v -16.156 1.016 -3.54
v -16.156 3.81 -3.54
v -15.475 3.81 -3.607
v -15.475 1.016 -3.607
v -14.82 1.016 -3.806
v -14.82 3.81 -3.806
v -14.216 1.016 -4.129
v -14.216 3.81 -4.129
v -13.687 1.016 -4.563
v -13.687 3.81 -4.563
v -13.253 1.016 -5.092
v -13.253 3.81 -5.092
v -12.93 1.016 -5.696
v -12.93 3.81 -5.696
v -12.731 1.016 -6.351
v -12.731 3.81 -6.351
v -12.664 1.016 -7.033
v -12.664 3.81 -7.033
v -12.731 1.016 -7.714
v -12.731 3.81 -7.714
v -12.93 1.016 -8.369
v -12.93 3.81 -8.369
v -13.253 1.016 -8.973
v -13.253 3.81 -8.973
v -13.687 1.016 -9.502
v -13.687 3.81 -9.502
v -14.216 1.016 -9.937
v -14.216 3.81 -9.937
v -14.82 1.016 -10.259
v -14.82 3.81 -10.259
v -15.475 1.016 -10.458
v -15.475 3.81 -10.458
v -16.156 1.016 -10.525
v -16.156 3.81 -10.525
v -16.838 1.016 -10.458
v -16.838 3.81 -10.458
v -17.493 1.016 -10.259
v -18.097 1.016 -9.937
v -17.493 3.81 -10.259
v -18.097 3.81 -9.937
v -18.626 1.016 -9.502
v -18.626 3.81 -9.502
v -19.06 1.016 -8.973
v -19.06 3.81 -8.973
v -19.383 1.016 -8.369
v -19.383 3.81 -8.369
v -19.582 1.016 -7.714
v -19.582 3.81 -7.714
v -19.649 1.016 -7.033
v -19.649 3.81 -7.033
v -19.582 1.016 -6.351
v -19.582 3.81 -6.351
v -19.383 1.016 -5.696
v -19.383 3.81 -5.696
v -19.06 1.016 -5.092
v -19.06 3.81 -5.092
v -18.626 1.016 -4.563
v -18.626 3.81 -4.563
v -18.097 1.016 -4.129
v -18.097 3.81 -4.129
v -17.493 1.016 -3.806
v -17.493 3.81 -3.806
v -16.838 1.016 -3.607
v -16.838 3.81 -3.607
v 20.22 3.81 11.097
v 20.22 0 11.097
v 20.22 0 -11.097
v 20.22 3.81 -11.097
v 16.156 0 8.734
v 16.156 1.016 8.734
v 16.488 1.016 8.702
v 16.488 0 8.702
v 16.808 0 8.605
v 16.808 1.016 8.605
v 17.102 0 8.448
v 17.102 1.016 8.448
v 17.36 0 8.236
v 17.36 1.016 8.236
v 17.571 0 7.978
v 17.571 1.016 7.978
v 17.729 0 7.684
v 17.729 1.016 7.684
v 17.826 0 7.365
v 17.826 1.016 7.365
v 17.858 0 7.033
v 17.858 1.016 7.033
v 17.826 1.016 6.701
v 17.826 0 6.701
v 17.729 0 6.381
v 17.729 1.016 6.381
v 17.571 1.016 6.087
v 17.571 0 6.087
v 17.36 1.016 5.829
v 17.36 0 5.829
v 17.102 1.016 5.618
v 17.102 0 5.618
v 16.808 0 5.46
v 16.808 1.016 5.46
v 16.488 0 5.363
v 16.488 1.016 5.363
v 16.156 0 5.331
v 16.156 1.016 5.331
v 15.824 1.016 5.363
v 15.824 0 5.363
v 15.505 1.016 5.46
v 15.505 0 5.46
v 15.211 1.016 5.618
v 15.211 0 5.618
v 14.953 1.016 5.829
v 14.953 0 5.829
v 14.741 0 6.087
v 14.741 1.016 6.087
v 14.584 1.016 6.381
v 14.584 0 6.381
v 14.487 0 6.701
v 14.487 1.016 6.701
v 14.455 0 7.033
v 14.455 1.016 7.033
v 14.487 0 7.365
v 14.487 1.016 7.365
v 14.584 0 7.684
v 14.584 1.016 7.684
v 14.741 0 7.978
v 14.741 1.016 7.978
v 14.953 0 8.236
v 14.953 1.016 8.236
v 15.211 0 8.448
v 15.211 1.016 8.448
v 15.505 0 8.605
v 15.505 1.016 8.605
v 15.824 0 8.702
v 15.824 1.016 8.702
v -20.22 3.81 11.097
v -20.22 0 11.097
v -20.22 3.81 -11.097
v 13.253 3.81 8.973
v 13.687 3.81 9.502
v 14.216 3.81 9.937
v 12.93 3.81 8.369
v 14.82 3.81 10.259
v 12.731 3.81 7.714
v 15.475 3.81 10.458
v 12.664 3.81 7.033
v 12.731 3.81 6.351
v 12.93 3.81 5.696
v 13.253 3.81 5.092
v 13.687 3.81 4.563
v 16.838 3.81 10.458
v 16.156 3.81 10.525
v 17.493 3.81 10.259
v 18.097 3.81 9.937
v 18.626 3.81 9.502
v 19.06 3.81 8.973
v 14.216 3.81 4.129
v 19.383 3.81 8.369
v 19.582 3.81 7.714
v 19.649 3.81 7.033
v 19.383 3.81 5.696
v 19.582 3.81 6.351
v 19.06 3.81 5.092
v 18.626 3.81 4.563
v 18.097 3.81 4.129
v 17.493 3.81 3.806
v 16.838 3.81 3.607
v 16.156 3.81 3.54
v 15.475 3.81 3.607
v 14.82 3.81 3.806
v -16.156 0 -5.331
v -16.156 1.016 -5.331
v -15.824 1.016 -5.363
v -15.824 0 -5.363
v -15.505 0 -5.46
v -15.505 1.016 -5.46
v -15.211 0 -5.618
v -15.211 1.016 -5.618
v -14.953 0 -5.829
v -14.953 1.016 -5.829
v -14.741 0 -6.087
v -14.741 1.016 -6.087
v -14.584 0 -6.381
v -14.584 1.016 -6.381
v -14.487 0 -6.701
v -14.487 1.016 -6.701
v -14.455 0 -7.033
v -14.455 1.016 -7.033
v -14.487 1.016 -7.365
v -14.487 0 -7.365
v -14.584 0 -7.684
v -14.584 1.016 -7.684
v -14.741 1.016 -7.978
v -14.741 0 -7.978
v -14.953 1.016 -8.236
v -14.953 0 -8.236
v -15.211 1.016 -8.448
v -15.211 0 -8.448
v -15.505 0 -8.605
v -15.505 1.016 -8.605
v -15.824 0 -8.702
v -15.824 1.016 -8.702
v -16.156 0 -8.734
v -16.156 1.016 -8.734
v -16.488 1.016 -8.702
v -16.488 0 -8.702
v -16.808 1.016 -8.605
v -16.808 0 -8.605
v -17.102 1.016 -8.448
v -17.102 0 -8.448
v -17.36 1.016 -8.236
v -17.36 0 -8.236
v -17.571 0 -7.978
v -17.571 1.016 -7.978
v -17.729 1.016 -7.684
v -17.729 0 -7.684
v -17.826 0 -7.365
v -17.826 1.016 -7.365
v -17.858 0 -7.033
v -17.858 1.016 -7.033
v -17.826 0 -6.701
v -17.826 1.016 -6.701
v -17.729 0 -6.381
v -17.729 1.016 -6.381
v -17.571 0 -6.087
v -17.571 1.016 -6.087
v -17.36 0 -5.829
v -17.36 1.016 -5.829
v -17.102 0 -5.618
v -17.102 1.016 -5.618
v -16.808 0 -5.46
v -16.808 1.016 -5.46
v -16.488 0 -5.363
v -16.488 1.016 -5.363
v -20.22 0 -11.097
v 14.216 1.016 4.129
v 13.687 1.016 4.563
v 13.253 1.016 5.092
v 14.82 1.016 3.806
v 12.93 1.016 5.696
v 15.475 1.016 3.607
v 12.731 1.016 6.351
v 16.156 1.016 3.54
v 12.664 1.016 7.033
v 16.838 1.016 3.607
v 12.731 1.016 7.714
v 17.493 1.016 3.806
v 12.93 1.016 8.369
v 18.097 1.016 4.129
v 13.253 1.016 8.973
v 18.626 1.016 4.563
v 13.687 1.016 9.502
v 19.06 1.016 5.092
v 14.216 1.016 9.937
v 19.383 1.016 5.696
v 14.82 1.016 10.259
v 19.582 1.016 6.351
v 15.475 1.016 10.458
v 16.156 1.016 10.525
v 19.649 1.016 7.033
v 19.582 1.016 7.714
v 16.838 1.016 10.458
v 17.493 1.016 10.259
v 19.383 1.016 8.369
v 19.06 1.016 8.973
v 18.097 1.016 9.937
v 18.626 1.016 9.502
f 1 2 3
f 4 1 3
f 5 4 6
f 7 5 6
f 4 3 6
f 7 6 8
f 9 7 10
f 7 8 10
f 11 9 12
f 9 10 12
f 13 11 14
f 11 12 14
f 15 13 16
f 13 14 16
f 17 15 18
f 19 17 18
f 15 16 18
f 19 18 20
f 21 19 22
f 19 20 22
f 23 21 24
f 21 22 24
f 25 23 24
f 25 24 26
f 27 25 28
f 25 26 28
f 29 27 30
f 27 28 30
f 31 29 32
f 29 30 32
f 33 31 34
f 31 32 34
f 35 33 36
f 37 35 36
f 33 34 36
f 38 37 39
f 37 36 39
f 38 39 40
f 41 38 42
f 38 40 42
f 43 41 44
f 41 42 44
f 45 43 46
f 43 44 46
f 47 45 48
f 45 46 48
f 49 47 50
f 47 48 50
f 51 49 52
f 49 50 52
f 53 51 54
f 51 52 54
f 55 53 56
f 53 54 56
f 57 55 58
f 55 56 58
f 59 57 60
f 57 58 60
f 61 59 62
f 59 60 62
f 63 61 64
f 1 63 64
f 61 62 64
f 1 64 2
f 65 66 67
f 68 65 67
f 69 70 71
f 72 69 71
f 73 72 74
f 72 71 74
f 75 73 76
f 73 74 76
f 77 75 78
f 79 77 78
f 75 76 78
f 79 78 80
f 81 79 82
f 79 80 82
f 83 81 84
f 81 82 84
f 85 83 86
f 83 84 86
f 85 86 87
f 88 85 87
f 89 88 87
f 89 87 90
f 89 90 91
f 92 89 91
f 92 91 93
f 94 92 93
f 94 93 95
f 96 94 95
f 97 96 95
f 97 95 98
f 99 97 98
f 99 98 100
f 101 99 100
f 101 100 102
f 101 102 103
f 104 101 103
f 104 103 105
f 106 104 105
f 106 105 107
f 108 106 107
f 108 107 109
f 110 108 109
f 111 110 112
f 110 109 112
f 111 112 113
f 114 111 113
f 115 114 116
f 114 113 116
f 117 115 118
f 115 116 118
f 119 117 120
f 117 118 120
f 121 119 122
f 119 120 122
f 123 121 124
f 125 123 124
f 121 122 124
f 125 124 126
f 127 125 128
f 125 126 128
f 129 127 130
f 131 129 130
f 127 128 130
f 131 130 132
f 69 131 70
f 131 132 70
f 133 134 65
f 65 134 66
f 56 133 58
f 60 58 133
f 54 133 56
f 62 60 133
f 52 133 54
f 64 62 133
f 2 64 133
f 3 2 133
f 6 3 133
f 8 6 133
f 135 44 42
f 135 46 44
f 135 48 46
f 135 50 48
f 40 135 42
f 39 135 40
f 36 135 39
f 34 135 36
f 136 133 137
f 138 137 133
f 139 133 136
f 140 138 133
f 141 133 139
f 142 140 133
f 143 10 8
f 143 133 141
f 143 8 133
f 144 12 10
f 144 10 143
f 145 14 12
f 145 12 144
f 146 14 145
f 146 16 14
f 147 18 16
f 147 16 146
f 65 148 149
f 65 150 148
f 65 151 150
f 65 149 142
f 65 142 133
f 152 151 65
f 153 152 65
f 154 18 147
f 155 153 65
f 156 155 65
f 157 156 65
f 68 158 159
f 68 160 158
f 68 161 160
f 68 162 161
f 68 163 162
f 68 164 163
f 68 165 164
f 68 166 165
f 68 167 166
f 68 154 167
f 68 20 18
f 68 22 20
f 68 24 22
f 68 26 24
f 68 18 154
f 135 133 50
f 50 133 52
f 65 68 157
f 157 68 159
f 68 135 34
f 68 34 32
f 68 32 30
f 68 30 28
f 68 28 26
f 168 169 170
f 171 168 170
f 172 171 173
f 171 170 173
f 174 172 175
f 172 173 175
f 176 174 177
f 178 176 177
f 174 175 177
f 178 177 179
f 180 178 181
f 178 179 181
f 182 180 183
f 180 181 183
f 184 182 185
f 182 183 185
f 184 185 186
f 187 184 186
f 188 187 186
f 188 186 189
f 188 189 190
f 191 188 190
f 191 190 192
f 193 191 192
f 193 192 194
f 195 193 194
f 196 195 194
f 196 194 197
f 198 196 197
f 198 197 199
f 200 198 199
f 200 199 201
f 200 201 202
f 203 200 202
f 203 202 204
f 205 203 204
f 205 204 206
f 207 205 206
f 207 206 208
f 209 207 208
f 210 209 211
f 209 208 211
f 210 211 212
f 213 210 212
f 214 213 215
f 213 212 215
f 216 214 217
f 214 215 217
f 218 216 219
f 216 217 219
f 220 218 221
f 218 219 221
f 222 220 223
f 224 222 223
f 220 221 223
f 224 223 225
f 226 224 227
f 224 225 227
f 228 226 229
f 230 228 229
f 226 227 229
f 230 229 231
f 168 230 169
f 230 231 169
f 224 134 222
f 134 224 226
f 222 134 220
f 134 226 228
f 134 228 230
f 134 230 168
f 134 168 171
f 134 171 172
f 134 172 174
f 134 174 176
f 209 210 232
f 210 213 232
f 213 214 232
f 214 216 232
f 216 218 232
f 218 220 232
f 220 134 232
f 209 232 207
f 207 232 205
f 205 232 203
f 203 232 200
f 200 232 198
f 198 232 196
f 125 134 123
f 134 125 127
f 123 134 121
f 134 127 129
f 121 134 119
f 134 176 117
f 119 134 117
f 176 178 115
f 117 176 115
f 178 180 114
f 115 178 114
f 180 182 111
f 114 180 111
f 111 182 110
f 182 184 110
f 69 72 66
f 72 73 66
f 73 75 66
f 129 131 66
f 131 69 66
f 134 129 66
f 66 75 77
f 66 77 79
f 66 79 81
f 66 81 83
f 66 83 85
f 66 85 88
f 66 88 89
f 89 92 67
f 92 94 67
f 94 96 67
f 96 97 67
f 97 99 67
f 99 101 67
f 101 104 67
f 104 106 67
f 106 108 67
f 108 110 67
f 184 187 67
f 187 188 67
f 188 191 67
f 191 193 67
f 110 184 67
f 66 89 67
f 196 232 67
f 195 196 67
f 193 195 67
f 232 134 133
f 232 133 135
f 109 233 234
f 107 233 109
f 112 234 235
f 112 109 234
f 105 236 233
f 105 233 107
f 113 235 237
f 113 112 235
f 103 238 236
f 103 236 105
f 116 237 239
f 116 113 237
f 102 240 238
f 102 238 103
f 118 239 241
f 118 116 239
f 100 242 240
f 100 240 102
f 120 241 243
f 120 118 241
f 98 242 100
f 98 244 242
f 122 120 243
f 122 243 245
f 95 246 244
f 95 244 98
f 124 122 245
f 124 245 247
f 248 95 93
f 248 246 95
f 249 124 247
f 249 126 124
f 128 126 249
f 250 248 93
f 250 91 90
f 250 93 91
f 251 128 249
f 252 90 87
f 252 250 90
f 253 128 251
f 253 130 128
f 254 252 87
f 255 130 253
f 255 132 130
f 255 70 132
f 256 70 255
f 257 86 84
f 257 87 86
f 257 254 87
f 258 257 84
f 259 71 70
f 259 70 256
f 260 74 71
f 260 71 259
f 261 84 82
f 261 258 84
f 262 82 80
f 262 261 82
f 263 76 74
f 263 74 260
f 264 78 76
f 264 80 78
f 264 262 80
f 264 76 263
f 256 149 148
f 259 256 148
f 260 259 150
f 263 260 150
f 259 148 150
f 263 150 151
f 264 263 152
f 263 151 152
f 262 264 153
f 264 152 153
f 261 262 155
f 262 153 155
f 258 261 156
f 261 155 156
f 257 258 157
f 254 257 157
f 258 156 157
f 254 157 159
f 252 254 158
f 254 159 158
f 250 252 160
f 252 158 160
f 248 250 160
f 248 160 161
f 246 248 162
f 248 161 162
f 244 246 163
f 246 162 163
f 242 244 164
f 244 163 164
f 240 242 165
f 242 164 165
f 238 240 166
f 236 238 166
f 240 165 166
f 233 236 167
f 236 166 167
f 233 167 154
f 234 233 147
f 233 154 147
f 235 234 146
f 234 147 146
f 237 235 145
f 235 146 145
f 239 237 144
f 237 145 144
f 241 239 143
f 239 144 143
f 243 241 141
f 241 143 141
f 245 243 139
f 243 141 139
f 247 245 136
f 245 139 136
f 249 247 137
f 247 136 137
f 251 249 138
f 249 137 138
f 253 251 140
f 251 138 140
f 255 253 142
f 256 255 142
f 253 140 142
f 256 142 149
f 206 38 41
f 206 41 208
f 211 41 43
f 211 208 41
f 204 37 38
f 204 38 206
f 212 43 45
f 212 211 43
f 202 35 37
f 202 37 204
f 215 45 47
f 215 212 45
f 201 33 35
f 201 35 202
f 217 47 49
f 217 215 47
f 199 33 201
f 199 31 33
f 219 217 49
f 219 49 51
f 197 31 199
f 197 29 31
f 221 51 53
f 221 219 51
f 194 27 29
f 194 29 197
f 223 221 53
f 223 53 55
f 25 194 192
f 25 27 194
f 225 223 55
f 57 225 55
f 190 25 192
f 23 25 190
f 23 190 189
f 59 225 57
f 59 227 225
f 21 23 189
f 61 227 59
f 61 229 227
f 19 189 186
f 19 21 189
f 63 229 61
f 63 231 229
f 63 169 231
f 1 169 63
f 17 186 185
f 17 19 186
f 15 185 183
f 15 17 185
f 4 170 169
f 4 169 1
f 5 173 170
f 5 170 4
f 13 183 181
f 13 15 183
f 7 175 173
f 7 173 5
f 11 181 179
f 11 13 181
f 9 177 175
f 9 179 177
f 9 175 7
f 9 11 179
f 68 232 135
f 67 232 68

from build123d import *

# Parameters (mm, degrees)
SKETCH1_W           = 40.44093781
SKETCH1_H           = 22.193197578
BOSS_EXTRUDE1_DEPTH = 3.81
SKETCH3_R           = 3.4925
CUT_EXTRUDE3_DEPTH  = 2.794
SKETCH3_4_R         = 1.7018
CUT_EXTRUDE4_DEPTH  = 24.377723743


with BuildPart() as part:
    # Sketch1 → Boss-Extrude1 (new body)
    with BuildSketch(Plane(origin=(0, 0, 0), x_dir=(1, 0, 0), z_dir=(0, 1, 0))):
        Rectangle(SKETCH1_W, SKETCH1_H)
    extrude(amount=BOSS_EXTRUDE1_DEPTH)

    # Sketch3 → Cut-Extrude3 (cut)
    with BuildSketch(Plane(origin=(0, 3.81, 0), x_dir=(1, 0, 0), z_dir=(0, 1, 0))):
        with Locations((-16.156468905, 7.032598789)):
            Circle(SKETCH3_R)
        with Locations((16.156468905, -7.032598789)):
            Circle(SKETCH3_R)
    extrude(amount=-CUT_EXTRUDE3_DEPTH, mode=Mode.SUBTRACT)

    # Sketch3<4> → Cut-Extrude4 (cut, through all)
    with BuildSketch(Plane(origin=(0, 3.81, 0), x_dir=(1, 0, 0), z_dir=(0, 1, 0))):
        with Locations((-16.156468905, 7.032598789)):
            Circle(SKETCH3_4_R)
        with Locations((16.156468905, -7.032598789)):
            Circle(SKETCH3_4_R)
    extrude(amount=-CUT_EXTRUDE4_DEPTH, mode=Mode.SUBTRACT)


solid = part.part
